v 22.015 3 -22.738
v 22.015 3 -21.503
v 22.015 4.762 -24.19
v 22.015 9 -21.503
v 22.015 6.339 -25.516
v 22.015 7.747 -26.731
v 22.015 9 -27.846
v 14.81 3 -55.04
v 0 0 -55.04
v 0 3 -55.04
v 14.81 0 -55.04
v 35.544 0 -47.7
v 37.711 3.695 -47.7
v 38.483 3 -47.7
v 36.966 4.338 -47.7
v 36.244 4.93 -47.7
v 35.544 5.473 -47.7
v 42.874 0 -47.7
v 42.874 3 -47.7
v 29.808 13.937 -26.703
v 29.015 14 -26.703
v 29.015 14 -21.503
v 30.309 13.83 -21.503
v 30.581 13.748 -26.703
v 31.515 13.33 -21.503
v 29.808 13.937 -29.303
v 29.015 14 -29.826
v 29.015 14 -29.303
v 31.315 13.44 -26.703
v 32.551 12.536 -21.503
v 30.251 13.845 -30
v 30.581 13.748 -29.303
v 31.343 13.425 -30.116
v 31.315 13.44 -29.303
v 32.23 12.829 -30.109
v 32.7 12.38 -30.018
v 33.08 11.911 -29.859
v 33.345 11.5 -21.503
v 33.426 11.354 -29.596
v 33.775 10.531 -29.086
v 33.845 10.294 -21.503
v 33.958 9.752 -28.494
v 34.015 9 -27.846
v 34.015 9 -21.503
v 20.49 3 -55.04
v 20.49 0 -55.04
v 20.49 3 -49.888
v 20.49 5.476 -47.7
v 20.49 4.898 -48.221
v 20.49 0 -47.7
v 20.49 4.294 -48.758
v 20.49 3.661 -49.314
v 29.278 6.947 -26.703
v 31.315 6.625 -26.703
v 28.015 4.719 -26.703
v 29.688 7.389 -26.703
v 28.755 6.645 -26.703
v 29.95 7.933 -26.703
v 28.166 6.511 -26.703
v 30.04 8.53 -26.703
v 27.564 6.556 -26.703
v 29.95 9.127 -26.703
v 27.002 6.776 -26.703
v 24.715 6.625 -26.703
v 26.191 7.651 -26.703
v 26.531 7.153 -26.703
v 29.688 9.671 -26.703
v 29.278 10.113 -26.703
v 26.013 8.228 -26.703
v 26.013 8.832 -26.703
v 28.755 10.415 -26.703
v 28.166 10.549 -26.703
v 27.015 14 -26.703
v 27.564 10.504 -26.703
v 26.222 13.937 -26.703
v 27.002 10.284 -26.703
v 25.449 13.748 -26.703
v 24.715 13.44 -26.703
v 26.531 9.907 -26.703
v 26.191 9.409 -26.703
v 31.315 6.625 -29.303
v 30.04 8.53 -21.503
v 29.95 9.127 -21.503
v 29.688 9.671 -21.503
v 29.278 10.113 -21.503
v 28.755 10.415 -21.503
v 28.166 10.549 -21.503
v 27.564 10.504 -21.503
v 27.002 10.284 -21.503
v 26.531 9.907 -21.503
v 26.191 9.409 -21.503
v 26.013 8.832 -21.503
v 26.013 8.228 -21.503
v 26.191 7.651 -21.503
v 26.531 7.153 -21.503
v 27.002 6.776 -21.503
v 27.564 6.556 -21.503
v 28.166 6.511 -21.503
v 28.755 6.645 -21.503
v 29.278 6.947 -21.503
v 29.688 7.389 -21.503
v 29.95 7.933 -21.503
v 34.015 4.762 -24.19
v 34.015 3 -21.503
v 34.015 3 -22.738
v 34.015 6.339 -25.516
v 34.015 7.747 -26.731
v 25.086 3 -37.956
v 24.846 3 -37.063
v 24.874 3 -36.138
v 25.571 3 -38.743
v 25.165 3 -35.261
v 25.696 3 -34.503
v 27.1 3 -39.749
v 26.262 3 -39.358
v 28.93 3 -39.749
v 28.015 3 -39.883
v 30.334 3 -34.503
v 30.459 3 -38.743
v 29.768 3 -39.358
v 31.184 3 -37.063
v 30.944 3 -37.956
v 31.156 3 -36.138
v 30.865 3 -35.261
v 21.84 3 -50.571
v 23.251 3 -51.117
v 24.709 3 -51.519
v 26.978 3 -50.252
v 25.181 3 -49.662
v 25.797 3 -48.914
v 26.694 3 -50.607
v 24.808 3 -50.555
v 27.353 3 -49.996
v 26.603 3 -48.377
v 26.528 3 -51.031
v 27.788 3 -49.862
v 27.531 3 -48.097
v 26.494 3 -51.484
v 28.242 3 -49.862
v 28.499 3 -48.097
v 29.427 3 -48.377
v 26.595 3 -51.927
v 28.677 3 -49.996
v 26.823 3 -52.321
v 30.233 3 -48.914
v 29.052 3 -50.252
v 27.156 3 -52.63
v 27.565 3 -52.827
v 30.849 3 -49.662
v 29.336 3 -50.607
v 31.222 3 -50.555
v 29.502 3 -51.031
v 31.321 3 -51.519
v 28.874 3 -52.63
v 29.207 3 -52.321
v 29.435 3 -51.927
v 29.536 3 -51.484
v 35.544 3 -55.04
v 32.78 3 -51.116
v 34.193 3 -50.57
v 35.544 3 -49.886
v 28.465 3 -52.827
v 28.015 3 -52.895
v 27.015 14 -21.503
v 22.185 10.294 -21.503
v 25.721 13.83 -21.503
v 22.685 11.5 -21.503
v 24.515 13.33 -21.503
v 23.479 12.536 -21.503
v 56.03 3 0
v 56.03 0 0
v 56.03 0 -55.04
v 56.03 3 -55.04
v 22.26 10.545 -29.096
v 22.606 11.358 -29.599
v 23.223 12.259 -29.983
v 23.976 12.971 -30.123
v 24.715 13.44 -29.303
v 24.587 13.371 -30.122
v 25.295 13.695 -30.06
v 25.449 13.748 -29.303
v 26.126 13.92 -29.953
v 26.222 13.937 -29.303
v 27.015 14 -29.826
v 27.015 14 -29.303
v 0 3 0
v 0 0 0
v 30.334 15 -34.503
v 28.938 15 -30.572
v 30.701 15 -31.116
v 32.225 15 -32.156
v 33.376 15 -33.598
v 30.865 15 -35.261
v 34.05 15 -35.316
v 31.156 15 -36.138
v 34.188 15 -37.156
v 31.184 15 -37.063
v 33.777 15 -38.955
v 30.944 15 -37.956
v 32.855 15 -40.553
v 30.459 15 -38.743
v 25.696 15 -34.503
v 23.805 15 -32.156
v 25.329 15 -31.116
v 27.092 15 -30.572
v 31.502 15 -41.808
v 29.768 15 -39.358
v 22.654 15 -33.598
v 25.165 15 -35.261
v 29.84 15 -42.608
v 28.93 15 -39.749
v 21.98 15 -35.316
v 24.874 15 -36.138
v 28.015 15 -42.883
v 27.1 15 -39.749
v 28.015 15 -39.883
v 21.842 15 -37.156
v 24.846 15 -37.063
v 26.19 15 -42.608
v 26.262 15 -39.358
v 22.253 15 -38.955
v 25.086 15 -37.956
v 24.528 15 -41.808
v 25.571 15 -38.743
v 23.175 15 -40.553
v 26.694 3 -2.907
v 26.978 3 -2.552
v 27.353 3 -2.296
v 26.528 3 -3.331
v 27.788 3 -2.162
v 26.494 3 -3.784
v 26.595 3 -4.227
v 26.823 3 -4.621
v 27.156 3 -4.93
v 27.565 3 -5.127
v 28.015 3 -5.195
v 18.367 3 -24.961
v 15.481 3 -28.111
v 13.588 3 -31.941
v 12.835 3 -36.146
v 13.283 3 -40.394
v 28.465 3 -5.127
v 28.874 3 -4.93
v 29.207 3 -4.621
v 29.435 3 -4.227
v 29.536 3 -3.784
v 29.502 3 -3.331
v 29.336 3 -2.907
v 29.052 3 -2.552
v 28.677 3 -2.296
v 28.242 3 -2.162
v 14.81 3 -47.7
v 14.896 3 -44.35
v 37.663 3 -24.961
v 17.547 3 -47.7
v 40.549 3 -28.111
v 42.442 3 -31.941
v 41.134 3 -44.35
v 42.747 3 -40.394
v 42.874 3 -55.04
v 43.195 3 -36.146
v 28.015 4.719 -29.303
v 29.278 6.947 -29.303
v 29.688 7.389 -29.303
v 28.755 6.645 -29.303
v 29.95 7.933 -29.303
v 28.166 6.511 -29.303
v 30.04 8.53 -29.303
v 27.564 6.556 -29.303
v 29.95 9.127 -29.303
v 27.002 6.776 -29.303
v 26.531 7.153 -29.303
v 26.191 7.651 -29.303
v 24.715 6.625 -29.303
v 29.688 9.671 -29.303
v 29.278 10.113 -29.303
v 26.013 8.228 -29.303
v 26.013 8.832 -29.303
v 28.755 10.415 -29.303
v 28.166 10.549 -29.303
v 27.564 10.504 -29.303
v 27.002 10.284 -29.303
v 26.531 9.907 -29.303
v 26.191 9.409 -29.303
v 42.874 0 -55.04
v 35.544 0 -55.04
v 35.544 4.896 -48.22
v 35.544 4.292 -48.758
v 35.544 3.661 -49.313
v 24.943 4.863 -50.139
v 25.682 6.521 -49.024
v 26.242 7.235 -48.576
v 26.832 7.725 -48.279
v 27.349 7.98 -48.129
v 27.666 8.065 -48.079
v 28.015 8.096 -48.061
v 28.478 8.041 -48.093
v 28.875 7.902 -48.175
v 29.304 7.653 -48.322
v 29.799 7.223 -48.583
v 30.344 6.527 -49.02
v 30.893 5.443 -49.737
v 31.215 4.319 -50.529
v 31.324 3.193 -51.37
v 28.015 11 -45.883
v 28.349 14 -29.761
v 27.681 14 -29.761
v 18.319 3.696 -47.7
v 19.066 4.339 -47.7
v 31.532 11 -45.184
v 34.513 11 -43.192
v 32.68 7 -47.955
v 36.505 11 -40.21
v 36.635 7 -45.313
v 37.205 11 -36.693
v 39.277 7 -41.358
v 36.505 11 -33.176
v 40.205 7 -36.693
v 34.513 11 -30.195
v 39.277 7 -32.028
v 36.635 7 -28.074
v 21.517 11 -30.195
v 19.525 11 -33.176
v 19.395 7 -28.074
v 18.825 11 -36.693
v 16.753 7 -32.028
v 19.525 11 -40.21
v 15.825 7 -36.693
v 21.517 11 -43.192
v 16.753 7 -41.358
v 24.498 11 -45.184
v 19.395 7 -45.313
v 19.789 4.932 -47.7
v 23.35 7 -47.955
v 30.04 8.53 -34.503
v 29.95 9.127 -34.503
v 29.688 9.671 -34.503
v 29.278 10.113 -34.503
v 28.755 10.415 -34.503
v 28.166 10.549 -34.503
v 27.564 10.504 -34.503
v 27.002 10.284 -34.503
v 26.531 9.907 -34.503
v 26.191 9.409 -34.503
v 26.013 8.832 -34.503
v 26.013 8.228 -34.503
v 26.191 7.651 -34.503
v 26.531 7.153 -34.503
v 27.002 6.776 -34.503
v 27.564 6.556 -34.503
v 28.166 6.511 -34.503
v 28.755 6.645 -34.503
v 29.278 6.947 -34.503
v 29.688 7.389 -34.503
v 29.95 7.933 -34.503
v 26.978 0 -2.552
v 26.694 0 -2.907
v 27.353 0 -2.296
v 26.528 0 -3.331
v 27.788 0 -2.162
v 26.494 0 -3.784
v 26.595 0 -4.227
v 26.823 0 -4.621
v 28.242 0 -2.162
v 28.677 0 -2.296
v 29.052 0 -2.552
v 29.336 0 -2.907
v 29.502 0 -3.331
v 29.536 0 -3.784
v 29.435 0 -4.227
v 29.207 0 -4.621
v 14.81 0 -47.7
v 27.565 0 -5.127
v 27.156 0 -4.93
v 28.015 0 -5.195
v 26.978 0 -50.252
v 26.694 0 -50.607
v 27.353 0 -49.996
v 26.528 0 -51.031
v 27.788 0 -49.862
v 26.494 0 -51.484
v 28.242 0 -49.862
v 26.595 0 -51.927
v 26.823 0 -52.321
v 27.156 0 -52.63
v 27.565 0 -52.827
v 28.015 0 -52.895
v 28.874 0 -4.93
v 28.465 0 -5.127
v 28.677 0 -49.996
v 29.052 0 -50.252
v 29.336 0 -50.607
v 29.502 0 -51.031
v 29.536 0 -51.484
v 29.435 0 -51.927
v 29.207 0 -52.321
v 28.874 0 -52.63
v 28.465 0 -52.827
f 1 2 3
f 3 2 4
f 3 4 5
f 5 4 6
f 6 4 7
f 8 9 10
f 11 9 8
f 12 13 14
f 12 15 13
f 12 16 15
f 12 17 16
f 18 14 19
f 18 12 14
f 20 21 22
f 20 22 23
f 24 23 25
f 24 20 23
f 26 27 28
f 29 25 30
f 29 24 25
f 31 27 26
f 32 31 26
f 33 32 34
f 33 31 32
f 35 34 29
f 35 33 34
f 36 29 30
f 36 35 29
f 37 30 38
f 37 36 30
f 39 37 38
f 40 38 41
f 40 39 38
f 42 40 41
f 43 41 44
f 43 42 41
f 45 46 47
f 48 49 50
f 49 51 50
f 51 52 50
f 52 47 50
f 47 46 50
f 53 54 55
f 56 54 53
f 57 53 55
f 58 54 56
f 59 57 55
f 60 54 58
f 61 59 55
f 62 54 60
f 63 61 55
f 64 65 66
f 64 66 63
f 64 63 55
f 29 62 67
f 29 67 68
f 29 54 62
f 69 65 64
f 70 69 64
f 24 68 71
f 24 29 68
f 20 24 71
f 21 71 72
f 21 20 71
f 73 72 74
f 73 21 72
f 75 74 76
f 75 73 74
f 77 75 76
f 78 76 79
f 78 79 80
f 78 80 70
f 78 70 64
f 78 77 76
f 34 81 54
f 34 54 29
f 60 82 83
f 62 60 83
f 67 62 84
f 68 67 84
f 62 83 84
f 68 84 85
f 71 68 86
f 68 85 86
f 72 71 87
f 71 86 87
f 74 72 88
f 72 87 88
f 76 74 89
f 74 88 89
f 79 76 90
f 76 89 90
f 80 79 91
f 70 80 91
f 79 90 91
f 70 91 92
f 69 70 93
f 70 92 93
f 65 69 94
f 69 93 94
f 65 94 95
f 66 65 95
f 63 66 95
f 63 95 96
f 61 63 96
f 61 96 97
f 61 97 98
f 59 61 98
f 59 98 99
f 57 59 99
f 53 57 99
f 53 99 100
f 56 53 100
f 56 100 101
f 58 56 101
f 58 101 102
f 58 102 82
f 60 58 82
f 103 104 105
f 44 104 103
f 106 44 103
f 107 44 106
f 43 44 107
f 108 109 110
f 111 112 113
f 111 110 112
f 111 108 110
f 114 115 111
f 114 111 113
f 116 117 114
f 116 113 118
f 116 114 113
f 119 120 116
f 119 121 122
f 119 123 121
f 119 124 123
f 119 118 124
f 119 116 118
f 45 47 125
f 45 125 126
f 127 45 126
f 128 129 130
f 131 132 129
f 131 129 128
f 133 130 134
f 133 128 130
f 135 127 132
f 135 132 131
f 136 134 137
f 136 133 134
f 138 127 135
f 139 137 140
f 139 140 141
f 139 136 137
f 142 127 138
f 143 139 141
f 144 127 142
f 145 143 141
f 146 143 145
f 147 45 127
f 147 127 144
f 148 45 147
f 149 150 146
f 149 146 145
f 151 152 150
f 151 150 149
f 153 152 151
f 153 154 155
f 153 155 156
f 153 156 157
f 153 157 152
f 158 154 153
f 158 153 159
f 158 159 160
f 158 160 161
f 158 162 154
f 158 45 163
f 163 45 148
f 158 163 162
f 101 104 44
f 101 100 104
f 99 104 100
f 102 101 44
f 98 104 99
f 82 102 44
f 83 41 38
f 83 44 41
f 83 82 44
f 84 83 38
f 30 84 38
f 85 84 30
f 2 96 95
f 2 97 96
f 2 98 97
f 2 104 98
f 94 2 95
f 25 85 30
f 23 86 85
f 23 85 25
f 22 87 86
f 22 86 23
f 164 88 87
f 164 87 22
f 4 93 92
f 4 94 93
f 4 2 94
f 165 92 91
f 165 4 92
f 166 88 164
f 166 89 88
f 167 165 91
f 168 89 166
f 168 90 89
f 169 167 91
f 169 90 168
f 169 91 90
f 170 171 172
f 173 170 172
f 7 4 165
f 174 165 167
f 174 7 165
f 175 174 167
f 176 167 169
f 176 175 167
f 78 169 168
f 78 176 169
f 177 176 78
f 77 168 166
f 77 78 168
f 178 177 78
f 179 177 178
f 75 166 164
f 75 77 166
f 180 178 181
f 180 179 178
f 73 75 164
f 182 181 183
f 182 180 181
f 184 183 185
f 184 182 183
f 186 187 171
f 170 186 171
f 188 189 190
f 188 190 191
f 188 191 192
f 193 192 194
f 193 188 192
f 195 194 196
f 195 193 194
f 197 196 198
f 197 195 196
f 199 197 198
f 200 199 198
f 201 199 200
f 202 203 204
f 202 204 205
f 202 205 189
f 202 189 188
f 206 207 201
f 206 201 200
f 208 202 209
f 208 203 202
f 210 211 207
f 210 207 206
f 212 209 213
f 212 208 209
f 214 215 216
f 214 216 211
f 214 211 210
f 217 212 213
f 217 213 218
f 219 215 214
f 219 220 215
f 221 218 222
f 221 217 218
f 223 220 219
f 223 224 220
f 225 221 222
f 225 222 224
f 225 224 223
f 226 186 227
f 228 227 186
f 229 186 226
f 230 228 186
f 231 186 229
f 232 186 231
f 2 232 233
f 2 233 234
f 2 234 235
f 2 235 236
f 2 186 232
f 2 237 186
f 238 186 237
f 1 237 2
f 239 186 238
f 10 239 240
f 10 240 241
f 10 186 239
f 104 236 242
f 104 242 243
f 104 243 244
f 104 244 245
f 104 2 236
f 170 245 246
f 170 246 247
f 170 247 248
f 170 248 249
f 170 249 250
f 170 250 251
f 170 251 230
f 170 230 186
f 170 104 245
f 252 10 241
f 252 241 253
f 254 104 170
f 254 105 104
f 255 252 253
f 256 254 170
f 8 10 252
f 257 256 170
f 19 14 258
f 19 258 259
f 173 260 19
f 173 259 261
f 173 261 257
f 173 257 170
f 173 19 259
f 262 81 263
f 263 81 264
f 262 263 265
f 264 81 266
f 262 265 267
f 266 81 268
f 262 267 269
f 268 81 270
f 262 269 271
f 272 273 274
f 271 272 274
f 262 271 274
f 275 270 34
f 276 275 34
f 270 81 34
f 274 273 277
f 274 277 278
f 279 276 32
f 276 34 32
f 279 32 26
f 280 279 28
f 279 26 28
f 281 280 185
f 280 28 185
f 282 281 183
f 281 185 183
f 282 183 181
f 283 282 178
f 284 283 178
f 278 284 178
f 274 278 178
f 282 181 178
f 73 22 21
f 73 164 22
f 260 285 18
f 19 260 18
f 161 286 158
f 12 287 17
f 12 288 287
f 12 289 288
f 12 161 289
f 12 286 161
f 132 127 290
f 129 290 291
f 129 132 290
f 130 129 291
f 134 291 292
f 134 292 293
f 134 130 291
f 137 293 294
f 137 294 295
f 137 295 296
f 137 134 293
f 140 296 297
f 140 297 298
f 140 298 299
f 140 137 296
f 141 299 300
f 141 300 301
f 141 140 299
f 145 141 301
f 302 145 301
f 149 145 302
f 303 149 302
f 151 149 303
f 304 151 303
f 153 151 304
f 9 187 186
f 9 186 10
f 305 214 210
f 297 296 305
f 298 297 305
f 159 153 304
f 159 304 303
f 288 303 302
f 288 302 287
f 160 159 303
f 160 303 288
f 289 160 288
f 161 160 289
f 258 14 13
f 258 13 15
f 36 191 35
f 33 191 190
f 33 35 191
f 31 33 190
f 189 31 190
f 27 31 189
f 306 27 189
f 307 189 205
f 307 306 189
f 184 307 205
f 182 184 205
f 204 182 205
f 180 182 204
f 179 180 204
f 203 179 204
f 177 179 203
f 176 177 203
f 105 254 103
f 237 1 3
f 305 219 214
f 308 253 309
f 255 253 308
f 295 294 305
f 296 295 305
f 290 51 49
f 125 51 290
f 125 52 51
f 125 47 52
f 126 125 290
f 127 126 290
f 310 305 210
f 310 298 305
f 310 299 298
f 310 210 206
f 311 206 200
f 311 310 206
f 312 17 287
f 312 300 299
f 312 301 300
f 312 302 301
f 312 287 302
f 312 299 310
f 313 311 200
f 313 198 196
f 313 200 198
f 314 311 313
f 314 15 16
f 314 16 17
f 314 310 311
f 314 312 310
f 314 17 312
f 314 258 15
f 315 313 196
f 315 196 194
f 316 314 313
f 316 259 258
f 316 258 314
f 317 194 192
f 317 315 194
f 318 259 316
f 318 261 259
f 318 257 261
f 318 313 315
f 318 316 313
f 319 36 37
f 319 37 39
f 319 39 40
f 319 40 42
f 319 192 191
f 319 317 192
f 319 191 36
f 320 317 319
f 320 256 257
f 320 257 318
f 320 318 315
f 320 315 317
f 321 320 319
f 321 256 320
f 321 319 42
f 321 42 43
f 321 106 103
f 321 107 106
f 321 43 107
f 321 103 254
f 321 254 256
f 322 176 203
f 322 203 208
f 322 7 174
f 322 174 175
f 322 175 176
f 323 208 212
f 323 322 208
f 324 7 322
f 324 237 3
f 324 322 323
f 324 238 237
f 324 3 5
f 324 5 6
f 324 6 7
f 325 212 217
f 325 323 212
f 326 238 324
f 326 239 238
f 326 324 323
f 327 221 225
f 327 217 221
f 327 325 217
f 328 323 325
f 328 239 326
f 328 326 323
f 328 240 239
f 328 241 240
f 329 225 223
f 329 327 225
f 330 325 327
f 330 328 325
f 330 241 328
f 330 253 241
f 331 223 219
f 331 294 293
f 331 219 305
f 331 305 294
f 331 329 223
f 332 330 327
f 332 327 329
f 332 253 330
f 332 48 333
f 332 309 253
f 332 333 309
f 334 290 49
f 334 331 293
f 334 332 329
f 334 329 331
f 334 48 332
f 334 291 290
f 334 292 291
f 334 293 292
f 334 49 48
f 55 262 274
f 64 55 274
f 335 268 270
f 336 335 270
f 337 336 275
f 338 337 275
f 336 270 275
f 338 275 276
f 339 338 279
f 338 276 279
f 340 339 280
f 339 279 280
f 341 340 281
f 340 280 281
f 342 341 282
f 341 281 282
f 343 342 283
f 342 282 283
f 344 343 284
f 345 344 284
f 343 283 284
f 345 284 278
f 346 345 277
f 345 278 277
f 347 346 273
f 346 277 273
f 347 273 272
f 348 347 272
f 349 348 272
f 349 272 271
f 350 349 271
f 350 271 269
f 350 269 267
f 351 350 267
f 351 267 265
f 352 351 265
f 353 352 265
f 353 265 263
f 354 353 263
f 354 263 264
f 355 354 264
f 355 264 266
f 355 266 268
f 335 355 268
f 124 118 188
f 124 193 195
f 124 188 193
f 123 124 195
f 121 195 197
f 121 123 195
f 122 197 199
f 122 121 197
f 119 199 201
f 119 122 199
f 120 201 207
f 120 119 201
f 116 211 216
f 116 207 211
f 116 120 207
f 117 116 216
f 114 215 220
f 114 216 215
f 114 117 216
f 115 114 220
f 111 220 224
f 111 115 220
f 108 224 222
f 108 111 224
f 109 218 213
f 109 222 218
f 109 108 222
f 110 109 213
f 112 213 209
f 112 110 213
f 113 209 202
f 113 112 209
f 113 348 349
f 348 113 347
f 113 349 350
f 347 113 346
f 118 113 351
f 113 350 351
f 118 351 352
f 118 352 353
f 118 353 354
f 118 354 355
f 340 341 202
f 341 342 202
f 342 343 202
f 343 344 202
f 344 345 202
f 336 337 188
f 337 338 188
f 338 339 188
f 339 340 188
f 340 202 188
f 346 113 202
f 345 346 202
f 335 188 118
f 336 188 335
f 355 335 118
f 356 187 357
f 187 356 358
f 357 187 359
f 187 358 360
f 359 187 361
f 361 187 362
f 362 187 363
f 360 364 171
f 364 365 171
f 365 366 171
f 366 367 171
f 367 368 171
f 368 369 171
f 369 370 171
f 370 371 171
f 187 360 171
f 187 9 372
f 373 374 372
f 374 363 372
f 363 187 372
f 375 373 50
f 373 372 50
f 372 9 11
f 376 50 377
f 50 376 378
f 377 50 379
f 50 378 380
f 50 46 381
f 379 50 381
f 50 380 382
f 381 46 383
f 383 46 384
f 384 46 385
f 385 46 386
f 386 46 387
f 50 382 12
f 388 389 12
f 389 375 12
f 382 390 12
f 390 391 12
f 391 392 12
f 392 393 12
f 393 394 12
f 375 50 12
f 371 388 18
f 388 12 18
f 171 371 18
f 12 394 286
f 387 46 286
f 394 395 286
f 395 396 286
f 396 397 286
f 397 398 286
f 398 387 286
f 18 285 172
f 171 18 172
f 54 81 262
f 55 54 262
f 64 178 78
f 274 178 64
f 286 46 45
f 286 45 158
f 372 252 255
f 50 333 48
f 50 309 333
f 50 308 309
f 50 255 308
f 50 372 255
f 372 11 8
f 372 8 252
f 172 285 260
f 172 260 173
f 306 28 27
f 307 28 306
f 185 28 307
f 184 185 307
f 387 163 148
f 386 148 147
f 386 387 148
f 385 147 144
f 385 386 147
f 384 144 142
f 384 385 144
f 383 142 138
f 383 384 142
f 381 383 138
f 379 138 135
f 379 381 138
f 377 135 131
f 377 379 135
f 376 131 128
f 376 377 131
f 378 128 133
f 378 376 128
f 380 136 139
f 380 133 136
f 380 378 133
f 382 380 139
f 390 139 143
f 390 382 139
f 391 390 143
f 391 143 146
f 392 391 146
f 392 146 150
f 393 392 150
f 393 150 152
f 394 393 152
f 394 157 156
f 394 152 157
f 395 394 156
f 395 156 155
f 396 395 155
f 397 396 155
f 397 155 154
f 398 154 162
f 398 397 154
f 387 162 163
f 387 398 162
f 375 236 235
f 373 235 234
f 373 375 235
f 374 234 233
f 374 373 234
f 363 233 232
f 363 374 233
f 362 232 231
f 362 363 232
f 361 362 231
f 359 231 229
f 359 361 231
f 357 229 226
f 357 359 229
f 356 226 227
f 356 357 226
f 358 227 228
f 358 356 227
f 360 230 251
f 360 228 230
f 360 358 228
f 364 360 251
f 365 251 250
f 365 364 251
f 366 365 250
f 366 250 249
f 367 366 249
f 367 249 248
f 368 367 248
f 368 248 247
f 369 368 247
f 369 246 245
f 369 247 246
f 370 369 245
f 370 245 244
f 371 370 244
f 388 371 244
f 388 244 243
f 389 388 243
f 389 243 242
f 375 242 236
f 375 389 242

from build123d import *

# Parameters (mm, degrees)
SKETCH1_W                = 56.03
SKETCH1_H                = 55.04
BOSS_EXTRUDE1_DEPTH      = 3
SKETCH2_R                = 6.19
SKETCH2_R_2              = 3.19
BOSS_EXTRUDE2_DEPTH      = 12
BOSS_EXTRUDE3_DEPTH      = 12
BOSS_EXTRUDE4_DEPTH      = 6
BOSS_EXTRUDE4_DEPTH_BACK = 6
SKETCH7_W                = 13
SKETCH7_H                = 11
FILLET1_R                = 5
SKETCH8_R                = 2.025
CUT_EXTRUDE3_DEPTH       = 13
CUT_EXTRUDE4_DEPTH       = 1.3
CUT_EXTRUDE4_DEPTH_BACK  = 1.3
CUT_EXTRUDE5_DEPTH       = 6
CUT_EXTRUDE5_DEPTH_BACK  = 3
SKETCH10_R               = 1.525
SKETCH11_R               = 3.309100225
CUT_EXTRUDE6_DEPTH       = 80.452894865
SKETCH12_W               = 7.33
SKETCH12_H               = 7.34
SKETCH12_W_2             = 5.68
CUT_EXTRUDE7_DEPTH       = 80.96100614


with BuildPart() as part:
    # Sketch1 → Boss-Extrude1 (new body)
    with BuildSketch(Plane(origin=(0, 0, 0), x_dir=(1, 0, 0), z_dir=(0, 1, 0))):
        with Locations((28.015, 27.52)):
            Rectangle(SKETCH1_W, SKETCH1_H)
    extrude(amount=BOSS_EXTRUDE1_DEPTH)

    # Sketch2 → Boss-Extrude2 (add)
    with BuildSketch(Plane(origin=(0, 3, 0), x_dir=(1, 0, 0), z_dir=(0, 1, 0))):
        with Locations(Location((28.015, 36.693201994, 0), (0, 0, 90))):
            Circle(SKETCH2_R)
        with Locations(Location((28.015, 36.693201994, 0), (0, 0, 270))):
            Circle(SKETCH2_R_2, mode=Mode.SUBTRACT)
    extrude(amount=BOSS_EXTRUDE2_DEPTH)

    # Sketch3 → Revolve1 (revolve)
    with BuildSketch(Plane(origin=(28.015, 0, 0), x_dir=(0, 0, -1), z_dir=(1, 0, 0))):
        Polygon((39.883201994, 15), (42.883201994, 15), (51.883201994, 3), (39.883201994, 3), align=None)
    revolve(axis=Axis((28.015, 15, -36.693201994), (0, -1, 0)))

    # Sketch5 → Boss-Extrude3 (add)
    with BuildSketch(Plane(origin=(0, 15, 0), x_dir=(1, 0, 0), z_dir=(0, 1, 0))):
        Polygon((28.015, 33.503201994), (24.778253514, 33.503201994), (24.778253514, 34.503201994), (31.698194277, 34.503201994), (31.698194277, 33.503201994), align=None)
    extrude(amount=-BOSS_EXTRUDE3_DEPTH)

    # Sketch7 → Boss-Extrude4 (add, two sides: drawn at the far end of the back side and taken through both)
    with BuildSketch(Plane(origin=(28.015, 0, 0), x_dir=(0, 0, -1), z_dir=(1, 0, 0)).offset(-BOSS_EXTRUDE4_DEPTH_BACK)):
        with Locations((28.003201994, 8.5)):
            Rectangle(SKETCH7_W, SKETCH7_H)
    extrude(amount=BOSS_EXTRUDE4_DEPTH + BOSS_EXTRUDE4_DEPTH_BACK)

    # Fillet1
    fillet1_edges = [part.edges().sort_by_distance(p)[0] for p in [
        (34.015, 14, -27.354384343),
        (22.015, 14, -27.354384343),
    ]]
    fillet(fillet1_edges, radius=FILLET1_R)

    # Sketch8 → Cut-Extrude3 (cut)
    with BuildSketch(Plane.XY.offset(-21.503201994)):
        with Locations((28.015, 8.53)):
            Circle(SKETCH8_R)
    extrude(amount=-CUT_EXTRUDE3_DEPTH, mode=Mode.SUBTRACT)

    # Sketch9 → Cut-Extrude4 (cut, two sides: drawn at the far end of the back side and taken through both)
    with BuildSketch(Plane.XY.offset(-28.003201994).offset(-CUT_EXTRUDE4_DEPTH_BACK)):
        Polygon((24.715, 10.435255888), (24.715, 15), (31.315, 15), (31.315, 10.435255888), (31.315, 6.624744112), (28.015, 4.719488223), (24.715, 6.624744112), align=None)
    extrude(amount=CUT_EXTRUDE4_DEPTH + CUT_EXTRUDE4_DEPTH_BACK, mode=Mode.SUBTRACT)

    # Sketch10 → Cut-Extrude5 (cut, two sides: drawn at the far end of the back side and taken through both)
    with BuildSketch(Plane(origin=(0, 3, 0), x_dir=(1, 0, 0), z_dir=(0, 1, 0)).offset(-CUT_EXTRUDE5_DEPTH_BACK)):
        with Locations(Location((28.015, 51.37, 0), (0, 0, 90))):
            Circle(SKETCH10_R)
        with Locations(Location((28.015, 3.67, 0), (0, 0, 90))):
            Circle(SKETCH10_R)
    extrude(amount=CUT_EXTRUDE5_DEPTH + CUT_EXTRUDE5_DEPTH_BACK, mode=Mode.SUBTRACT)

    # Sketch11 → Cut-Extrude6 (cut, through all)
    with BuildSketch(Plane(origin=(0, 3, 0), x_dir=(1, 0, 0), z_dir=(0, 1, 0))):
        with Locations((28.015, 51.37)):
            Circle(SKETCH11_R)
    extrude(amount=CUT_EXTRUDE6_DEPTH, mode=Mode.SUBTRACT)

    # Sketch12 → Cut-Extrude7 (cut, through all)
    with BuildSketch(Plane.XZ):
        with Locations((39.208604027, -51.37)):
            Rectangle(SKETCH12_W, SKETCH12_H)
        with Locations((17.65, -51.37)):
            Rectangle(SKETCH12_W_2, SKETCH12_H)
    extrude(amount=-CUT_EXTRUDE7_DEPTH, mode=Mode.SUBTRACT)


solid = part.part
